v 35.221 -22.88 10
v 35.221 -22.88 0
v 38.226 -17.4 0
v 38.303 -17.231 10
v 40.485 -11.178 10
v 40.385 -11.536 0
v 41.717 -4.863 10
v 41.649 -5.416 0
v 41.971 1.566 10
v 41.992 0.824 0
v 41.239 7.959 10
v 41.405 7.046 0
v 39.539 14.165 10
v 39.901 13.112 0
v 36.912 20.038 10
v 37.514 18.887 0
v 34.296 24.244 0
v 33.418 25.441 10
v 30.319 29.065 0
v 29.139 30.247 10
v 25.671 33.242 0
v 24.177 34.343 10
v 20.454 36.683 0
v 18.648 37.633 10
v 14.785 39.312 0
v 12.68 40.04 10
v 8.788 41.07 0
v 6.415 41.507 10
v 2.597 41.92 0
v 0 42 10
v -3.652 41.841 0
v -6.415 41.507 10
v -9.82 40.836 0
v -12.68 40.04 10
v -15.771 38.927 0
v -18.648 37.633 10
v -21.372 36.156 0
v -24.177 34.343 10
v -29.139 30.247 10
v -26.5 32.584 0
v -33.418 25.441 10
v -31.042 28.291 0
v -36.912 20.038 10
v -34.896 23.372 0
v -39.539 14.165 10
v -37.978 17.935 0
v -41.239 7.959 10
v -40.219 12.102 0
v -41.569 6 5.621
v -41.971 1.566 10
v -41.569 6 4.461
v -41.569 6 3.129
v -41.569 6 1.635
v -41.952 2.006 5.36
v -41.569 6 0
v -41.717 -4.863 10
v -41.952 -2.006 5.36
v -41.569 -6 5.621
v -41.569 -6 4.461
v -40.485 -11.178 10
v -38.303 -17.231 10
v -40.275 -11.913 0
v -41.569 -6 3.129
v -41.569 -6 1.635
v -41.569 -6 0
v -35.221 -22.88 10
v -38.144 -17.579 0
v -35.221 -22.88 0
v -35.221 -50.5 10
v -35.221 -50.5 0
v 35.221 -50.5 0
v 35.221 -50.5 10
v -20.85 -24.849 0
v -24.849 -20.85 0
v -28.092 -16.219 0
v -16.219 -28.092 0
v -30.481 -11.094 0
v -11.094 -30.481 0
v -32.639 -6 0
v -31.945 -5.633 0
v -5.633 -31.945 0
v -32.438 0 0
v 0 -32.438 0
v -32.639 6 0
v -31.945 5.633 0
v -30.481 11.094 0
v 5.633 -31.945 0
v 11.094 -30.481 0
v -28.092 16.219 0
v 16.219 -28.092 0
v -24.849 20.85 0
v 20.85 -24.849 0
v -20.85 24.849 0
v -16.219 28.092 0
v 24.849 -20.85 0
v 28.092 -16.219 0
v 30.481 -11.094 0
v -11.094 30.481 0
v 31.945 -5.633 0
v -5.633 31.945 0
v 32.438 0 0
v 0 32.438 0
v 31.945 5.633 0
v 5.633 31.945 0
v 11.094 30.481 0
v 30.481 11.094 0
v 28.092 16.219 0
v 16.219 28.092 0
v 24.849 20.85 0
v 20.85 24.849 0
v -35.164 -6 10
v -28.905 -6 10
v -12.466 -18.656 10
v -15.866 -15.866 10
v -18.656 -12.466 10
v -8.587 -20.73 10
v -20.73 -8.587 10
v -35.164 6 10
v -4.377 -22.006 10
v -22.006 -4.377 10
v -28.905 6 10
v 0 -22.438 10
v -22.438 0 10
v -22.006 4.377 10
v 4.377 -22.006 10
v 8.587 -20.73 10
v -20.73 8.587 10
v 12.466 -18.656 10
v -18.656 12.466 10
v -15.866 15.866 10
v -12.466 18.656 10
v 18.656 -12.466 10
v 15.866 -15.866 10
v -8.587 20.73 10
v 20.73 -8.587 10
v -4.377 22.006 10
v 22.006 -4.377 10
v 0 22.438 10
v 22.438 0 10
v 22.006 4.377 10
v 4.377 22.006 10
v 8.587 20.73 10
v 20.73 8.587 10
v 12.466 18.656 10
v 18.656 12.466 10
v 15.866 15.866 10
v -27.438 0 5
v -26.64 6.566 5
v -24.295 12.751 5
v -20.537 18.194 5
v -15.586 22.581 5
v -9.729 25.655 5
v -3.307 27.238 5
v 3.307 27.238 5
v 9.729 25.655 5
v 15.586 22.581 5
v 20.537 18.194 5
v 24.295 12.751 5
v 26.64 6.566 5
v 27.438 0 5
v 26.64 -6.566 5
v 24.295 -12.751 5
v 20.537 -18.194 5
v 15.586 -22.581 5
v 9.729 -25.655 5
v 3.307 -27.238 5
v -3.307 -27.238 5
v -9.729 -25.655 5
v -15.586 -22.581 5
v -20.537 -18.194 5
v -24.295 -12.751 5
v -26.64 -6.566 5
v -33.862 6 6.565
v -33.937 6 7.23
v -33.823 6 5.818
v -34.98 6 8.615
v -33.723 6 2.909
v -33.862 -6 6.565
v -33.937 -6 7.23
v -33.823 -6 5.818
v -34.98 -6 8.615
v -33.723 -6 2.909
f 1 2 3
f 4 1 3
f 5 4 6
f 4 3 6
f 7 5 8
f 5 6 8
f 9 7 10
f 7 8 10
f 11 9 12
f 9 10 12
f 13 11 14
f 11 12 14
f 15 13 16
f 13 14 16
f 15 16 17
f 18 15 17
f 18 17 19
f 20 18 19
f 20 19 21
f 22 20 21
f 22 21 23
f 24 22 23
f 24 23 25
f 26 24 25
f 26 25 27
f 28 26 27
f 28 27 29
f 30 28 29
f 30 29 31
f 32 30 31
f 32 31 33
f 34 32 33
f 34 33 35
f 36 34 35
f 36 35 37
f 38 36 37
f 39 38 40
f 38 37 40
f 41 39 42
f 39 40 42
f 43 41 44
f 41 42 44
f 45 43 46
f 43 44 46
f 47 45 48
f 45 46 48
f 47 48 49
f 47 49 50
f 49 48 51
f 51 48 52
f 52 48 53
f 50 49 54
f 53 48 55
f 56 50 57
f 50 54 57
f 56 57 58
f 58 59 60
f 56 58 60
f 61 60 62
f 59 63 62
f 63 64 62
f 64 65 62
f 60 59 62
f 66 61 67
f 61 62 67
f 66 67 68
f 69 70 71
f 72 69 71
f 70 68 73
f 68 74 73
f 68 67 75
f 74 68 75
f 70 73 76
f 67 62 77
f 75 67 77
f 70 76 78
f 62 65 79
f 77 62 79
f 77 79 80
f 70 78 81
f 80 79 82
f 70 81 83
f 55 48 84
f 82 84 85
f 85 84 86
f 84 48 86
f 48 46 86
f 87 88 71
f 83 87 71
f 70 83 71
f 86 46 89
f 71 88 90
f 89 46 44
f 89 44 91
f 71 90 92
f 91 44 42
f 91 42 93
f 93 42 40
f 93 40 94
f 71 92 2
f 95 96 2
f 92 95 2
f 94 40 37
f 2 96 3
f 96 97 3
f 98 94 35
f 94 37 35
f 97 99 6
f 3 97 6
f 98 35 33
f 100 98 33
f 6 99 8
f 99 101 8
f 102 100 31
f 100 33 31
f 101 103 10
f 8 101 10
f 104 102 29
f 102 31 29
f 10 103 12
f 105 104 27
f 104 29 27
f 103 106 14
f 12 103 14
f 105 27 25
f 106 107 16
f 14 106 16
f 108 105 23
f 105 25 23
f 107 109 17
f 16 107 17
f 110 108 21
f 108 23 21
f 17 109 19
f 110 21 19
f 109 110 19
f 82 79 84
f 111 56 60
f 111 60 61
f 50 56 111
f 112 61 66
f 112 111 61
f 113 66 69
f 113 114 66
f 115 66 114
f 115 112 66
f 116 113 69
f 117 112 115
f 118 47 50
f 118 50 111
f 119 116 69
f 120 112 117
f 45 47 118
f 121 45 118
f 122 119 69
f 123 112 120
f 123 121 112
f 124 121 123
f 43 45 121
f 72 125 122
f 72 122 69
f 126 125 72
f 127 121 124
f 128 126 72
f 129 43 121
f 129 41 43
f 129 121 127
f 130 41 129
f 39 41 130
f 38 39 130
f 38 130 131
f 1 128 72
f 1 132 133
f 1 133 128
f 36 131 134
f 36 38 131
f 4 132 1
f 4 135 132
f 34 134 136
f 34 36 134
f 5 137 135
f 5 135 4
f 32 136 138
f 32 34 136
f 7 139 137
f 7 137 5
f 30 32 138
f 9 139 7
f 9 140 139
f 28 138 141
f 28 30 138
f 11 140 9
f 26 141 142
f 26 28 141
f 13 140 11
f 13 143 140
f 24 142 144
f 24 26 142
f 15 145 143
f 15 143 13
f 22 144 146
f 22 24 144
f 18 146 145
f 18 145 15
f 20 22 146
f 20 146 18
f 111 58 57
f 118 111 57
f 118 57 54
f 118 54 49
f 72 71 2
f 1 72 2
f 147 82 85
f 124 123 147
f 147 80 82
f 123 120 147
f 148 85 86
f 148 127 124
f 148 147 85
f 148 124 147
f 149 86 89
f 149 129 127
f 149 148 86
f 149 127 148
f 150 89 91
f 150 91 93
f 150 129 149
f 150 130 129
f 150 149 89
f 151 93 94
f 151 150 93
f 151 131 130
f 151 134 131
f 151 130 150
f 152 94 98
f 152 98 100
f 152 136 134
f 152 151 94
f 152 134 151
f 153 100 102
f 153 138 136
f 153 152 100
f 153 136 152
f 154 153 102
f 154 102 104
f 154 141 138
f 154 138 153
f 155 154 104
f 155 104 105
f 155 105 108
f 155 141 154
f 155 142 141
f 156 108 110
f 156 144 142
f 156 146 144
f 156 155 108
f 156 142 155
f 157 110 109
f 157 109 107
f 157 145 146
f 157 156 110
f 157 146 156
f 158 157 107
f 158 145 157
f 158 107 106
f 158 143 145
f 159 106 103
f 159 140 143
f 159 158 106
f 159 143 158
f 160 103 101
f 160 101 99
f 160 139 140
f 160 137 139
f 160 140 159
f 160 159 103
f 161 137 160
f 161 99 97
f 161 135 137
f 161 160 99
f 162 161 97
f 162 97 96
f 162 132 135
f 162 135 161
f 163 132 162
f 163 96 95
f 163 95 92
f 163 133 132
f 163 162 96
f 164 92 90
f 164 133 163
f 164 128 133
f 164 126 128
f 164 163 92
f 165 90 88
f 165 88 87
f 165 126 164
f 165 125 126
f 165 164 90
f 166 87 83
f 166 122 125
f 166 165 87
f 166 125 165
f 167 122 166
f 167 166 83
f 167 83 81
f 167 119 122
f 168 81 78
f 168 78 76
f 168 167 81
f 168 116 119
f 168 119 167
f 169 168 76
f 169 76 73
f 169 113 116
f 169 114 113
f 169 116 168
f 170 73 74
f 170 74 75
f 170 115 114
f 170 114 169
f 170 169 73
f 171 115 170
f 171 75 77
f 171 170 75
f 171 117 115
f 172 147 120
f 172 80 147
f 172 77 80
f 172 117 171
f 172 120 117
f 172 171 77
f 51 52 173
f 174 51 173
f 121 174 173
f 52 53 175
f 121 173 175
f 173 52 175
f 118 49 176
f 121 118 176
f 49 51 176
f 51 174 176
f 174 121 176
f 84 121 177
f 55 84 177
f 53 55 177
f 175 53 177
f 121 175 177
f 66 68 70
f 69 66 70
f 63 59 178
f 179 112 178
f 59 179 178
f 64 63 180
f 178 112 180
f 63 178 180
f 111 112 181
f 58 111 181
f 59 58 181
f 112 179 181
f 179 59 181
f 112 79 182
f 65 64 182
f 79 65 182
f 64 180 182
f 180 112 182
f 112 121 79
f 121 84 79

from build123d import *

# Parameters (mm, degrees)
BOSS_EXTRUDE1_DEPTH = 10
SKETCH4_R           = 22.437608593
CUT_EXTRUDE1_DEPTH  = 30
CHAMFER1_SIZE       = 10


with BuildPart() as part:
    # Sketch1 → Boss-Extrude1 (new body)
    with BuildSketch(Plane.XY):
        with BuildLine():
            Line((-35.220966732, -22.879761853), (-35.220966732, -50.5))
            Line((-35.220966732, -50.5), (35.220966732, -50.5))
            Line((35.220966732, -50.5), (35.220966732, -22.879761853))
            ThreePointArc((35.220966732, -22.879761853), (0, 42), (-35.220966732, -22.879761853))
        make_face()
    extrude(amount=BOSS_EXTRUDE1_DEPTH)

    # Sketch3 → Cut-Loft1 section 0
    with BuildSketch(Plane.XY.offset(10)):
        with BuildLine():
            Line((-35.164273033, 6), (-28.90529198, 6))
            Line((-28.90529198, 6), (-28.90529198, -6))
            Line((-28.90529198, -6), (-35.164273033, -6))
            Line((-35.164273033, -6), (-35.164273033, 6))
        make_face()
    # Sketch2 → Cut-Loft1 section 1
    with BuildSketch(Plane(origin=(0, 0, 0), x_dir=(-1, 0, 0), z_dir=(0, 0, -1))):
        with BuildLine():
            Line((32.638910343, 6), (49.791813943, 6))
            Line((49.791813943, 6), (49.791813943, -6))
            Line((49.791813943, -6), (32.638910343, -6))
            Line((32.638910343, -6), (32.638910343, 6))
        make_face()
    loft(mode=Mode.SUBTRACT)

    # Sketch4 → Cut-Extrude1 (cut)
    with BuildSketch(Plane(origin=(0, 0, 0), x_dir=(-1, 0, 0), z_dir=(0, 0, -1))):
        Circle(SKETCH4_R)
    extrude(amount=-CUT_EXTRUDE1_DEPTH, mode=Mode.SUBTRACT)

    # Chamfer1
    chamfer1_edges = [part.edges().sort_by_distance(p)[0] for p in [
        (22.437608593, 0, 0),
    ]]
    chamfer(chamfer1_edges, length=CHAMFER1_SIZE - 0.0001)  # a hair under: the kernel refuses the full size


solid = part.part
